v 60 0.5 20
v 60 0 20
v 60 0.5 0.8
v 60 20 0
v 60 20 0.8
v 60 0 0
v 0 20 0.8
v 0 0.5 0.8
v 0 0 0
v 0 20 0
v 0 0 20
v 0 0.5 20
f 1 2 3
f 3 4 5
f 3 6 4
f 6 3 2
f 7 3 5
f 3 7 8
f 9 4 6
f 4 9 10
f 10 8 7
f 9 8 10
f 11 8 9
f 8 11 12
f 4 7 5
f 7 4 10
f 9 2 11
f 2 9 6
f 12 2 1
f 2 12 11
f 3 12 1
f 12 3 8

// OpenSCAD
length = 60;
height = 20;
foot = 20;
thickness = 0.5;
foot_t = 0.8;

cube([length, foot, foot_t]);
cube([length, thickness, height]);
